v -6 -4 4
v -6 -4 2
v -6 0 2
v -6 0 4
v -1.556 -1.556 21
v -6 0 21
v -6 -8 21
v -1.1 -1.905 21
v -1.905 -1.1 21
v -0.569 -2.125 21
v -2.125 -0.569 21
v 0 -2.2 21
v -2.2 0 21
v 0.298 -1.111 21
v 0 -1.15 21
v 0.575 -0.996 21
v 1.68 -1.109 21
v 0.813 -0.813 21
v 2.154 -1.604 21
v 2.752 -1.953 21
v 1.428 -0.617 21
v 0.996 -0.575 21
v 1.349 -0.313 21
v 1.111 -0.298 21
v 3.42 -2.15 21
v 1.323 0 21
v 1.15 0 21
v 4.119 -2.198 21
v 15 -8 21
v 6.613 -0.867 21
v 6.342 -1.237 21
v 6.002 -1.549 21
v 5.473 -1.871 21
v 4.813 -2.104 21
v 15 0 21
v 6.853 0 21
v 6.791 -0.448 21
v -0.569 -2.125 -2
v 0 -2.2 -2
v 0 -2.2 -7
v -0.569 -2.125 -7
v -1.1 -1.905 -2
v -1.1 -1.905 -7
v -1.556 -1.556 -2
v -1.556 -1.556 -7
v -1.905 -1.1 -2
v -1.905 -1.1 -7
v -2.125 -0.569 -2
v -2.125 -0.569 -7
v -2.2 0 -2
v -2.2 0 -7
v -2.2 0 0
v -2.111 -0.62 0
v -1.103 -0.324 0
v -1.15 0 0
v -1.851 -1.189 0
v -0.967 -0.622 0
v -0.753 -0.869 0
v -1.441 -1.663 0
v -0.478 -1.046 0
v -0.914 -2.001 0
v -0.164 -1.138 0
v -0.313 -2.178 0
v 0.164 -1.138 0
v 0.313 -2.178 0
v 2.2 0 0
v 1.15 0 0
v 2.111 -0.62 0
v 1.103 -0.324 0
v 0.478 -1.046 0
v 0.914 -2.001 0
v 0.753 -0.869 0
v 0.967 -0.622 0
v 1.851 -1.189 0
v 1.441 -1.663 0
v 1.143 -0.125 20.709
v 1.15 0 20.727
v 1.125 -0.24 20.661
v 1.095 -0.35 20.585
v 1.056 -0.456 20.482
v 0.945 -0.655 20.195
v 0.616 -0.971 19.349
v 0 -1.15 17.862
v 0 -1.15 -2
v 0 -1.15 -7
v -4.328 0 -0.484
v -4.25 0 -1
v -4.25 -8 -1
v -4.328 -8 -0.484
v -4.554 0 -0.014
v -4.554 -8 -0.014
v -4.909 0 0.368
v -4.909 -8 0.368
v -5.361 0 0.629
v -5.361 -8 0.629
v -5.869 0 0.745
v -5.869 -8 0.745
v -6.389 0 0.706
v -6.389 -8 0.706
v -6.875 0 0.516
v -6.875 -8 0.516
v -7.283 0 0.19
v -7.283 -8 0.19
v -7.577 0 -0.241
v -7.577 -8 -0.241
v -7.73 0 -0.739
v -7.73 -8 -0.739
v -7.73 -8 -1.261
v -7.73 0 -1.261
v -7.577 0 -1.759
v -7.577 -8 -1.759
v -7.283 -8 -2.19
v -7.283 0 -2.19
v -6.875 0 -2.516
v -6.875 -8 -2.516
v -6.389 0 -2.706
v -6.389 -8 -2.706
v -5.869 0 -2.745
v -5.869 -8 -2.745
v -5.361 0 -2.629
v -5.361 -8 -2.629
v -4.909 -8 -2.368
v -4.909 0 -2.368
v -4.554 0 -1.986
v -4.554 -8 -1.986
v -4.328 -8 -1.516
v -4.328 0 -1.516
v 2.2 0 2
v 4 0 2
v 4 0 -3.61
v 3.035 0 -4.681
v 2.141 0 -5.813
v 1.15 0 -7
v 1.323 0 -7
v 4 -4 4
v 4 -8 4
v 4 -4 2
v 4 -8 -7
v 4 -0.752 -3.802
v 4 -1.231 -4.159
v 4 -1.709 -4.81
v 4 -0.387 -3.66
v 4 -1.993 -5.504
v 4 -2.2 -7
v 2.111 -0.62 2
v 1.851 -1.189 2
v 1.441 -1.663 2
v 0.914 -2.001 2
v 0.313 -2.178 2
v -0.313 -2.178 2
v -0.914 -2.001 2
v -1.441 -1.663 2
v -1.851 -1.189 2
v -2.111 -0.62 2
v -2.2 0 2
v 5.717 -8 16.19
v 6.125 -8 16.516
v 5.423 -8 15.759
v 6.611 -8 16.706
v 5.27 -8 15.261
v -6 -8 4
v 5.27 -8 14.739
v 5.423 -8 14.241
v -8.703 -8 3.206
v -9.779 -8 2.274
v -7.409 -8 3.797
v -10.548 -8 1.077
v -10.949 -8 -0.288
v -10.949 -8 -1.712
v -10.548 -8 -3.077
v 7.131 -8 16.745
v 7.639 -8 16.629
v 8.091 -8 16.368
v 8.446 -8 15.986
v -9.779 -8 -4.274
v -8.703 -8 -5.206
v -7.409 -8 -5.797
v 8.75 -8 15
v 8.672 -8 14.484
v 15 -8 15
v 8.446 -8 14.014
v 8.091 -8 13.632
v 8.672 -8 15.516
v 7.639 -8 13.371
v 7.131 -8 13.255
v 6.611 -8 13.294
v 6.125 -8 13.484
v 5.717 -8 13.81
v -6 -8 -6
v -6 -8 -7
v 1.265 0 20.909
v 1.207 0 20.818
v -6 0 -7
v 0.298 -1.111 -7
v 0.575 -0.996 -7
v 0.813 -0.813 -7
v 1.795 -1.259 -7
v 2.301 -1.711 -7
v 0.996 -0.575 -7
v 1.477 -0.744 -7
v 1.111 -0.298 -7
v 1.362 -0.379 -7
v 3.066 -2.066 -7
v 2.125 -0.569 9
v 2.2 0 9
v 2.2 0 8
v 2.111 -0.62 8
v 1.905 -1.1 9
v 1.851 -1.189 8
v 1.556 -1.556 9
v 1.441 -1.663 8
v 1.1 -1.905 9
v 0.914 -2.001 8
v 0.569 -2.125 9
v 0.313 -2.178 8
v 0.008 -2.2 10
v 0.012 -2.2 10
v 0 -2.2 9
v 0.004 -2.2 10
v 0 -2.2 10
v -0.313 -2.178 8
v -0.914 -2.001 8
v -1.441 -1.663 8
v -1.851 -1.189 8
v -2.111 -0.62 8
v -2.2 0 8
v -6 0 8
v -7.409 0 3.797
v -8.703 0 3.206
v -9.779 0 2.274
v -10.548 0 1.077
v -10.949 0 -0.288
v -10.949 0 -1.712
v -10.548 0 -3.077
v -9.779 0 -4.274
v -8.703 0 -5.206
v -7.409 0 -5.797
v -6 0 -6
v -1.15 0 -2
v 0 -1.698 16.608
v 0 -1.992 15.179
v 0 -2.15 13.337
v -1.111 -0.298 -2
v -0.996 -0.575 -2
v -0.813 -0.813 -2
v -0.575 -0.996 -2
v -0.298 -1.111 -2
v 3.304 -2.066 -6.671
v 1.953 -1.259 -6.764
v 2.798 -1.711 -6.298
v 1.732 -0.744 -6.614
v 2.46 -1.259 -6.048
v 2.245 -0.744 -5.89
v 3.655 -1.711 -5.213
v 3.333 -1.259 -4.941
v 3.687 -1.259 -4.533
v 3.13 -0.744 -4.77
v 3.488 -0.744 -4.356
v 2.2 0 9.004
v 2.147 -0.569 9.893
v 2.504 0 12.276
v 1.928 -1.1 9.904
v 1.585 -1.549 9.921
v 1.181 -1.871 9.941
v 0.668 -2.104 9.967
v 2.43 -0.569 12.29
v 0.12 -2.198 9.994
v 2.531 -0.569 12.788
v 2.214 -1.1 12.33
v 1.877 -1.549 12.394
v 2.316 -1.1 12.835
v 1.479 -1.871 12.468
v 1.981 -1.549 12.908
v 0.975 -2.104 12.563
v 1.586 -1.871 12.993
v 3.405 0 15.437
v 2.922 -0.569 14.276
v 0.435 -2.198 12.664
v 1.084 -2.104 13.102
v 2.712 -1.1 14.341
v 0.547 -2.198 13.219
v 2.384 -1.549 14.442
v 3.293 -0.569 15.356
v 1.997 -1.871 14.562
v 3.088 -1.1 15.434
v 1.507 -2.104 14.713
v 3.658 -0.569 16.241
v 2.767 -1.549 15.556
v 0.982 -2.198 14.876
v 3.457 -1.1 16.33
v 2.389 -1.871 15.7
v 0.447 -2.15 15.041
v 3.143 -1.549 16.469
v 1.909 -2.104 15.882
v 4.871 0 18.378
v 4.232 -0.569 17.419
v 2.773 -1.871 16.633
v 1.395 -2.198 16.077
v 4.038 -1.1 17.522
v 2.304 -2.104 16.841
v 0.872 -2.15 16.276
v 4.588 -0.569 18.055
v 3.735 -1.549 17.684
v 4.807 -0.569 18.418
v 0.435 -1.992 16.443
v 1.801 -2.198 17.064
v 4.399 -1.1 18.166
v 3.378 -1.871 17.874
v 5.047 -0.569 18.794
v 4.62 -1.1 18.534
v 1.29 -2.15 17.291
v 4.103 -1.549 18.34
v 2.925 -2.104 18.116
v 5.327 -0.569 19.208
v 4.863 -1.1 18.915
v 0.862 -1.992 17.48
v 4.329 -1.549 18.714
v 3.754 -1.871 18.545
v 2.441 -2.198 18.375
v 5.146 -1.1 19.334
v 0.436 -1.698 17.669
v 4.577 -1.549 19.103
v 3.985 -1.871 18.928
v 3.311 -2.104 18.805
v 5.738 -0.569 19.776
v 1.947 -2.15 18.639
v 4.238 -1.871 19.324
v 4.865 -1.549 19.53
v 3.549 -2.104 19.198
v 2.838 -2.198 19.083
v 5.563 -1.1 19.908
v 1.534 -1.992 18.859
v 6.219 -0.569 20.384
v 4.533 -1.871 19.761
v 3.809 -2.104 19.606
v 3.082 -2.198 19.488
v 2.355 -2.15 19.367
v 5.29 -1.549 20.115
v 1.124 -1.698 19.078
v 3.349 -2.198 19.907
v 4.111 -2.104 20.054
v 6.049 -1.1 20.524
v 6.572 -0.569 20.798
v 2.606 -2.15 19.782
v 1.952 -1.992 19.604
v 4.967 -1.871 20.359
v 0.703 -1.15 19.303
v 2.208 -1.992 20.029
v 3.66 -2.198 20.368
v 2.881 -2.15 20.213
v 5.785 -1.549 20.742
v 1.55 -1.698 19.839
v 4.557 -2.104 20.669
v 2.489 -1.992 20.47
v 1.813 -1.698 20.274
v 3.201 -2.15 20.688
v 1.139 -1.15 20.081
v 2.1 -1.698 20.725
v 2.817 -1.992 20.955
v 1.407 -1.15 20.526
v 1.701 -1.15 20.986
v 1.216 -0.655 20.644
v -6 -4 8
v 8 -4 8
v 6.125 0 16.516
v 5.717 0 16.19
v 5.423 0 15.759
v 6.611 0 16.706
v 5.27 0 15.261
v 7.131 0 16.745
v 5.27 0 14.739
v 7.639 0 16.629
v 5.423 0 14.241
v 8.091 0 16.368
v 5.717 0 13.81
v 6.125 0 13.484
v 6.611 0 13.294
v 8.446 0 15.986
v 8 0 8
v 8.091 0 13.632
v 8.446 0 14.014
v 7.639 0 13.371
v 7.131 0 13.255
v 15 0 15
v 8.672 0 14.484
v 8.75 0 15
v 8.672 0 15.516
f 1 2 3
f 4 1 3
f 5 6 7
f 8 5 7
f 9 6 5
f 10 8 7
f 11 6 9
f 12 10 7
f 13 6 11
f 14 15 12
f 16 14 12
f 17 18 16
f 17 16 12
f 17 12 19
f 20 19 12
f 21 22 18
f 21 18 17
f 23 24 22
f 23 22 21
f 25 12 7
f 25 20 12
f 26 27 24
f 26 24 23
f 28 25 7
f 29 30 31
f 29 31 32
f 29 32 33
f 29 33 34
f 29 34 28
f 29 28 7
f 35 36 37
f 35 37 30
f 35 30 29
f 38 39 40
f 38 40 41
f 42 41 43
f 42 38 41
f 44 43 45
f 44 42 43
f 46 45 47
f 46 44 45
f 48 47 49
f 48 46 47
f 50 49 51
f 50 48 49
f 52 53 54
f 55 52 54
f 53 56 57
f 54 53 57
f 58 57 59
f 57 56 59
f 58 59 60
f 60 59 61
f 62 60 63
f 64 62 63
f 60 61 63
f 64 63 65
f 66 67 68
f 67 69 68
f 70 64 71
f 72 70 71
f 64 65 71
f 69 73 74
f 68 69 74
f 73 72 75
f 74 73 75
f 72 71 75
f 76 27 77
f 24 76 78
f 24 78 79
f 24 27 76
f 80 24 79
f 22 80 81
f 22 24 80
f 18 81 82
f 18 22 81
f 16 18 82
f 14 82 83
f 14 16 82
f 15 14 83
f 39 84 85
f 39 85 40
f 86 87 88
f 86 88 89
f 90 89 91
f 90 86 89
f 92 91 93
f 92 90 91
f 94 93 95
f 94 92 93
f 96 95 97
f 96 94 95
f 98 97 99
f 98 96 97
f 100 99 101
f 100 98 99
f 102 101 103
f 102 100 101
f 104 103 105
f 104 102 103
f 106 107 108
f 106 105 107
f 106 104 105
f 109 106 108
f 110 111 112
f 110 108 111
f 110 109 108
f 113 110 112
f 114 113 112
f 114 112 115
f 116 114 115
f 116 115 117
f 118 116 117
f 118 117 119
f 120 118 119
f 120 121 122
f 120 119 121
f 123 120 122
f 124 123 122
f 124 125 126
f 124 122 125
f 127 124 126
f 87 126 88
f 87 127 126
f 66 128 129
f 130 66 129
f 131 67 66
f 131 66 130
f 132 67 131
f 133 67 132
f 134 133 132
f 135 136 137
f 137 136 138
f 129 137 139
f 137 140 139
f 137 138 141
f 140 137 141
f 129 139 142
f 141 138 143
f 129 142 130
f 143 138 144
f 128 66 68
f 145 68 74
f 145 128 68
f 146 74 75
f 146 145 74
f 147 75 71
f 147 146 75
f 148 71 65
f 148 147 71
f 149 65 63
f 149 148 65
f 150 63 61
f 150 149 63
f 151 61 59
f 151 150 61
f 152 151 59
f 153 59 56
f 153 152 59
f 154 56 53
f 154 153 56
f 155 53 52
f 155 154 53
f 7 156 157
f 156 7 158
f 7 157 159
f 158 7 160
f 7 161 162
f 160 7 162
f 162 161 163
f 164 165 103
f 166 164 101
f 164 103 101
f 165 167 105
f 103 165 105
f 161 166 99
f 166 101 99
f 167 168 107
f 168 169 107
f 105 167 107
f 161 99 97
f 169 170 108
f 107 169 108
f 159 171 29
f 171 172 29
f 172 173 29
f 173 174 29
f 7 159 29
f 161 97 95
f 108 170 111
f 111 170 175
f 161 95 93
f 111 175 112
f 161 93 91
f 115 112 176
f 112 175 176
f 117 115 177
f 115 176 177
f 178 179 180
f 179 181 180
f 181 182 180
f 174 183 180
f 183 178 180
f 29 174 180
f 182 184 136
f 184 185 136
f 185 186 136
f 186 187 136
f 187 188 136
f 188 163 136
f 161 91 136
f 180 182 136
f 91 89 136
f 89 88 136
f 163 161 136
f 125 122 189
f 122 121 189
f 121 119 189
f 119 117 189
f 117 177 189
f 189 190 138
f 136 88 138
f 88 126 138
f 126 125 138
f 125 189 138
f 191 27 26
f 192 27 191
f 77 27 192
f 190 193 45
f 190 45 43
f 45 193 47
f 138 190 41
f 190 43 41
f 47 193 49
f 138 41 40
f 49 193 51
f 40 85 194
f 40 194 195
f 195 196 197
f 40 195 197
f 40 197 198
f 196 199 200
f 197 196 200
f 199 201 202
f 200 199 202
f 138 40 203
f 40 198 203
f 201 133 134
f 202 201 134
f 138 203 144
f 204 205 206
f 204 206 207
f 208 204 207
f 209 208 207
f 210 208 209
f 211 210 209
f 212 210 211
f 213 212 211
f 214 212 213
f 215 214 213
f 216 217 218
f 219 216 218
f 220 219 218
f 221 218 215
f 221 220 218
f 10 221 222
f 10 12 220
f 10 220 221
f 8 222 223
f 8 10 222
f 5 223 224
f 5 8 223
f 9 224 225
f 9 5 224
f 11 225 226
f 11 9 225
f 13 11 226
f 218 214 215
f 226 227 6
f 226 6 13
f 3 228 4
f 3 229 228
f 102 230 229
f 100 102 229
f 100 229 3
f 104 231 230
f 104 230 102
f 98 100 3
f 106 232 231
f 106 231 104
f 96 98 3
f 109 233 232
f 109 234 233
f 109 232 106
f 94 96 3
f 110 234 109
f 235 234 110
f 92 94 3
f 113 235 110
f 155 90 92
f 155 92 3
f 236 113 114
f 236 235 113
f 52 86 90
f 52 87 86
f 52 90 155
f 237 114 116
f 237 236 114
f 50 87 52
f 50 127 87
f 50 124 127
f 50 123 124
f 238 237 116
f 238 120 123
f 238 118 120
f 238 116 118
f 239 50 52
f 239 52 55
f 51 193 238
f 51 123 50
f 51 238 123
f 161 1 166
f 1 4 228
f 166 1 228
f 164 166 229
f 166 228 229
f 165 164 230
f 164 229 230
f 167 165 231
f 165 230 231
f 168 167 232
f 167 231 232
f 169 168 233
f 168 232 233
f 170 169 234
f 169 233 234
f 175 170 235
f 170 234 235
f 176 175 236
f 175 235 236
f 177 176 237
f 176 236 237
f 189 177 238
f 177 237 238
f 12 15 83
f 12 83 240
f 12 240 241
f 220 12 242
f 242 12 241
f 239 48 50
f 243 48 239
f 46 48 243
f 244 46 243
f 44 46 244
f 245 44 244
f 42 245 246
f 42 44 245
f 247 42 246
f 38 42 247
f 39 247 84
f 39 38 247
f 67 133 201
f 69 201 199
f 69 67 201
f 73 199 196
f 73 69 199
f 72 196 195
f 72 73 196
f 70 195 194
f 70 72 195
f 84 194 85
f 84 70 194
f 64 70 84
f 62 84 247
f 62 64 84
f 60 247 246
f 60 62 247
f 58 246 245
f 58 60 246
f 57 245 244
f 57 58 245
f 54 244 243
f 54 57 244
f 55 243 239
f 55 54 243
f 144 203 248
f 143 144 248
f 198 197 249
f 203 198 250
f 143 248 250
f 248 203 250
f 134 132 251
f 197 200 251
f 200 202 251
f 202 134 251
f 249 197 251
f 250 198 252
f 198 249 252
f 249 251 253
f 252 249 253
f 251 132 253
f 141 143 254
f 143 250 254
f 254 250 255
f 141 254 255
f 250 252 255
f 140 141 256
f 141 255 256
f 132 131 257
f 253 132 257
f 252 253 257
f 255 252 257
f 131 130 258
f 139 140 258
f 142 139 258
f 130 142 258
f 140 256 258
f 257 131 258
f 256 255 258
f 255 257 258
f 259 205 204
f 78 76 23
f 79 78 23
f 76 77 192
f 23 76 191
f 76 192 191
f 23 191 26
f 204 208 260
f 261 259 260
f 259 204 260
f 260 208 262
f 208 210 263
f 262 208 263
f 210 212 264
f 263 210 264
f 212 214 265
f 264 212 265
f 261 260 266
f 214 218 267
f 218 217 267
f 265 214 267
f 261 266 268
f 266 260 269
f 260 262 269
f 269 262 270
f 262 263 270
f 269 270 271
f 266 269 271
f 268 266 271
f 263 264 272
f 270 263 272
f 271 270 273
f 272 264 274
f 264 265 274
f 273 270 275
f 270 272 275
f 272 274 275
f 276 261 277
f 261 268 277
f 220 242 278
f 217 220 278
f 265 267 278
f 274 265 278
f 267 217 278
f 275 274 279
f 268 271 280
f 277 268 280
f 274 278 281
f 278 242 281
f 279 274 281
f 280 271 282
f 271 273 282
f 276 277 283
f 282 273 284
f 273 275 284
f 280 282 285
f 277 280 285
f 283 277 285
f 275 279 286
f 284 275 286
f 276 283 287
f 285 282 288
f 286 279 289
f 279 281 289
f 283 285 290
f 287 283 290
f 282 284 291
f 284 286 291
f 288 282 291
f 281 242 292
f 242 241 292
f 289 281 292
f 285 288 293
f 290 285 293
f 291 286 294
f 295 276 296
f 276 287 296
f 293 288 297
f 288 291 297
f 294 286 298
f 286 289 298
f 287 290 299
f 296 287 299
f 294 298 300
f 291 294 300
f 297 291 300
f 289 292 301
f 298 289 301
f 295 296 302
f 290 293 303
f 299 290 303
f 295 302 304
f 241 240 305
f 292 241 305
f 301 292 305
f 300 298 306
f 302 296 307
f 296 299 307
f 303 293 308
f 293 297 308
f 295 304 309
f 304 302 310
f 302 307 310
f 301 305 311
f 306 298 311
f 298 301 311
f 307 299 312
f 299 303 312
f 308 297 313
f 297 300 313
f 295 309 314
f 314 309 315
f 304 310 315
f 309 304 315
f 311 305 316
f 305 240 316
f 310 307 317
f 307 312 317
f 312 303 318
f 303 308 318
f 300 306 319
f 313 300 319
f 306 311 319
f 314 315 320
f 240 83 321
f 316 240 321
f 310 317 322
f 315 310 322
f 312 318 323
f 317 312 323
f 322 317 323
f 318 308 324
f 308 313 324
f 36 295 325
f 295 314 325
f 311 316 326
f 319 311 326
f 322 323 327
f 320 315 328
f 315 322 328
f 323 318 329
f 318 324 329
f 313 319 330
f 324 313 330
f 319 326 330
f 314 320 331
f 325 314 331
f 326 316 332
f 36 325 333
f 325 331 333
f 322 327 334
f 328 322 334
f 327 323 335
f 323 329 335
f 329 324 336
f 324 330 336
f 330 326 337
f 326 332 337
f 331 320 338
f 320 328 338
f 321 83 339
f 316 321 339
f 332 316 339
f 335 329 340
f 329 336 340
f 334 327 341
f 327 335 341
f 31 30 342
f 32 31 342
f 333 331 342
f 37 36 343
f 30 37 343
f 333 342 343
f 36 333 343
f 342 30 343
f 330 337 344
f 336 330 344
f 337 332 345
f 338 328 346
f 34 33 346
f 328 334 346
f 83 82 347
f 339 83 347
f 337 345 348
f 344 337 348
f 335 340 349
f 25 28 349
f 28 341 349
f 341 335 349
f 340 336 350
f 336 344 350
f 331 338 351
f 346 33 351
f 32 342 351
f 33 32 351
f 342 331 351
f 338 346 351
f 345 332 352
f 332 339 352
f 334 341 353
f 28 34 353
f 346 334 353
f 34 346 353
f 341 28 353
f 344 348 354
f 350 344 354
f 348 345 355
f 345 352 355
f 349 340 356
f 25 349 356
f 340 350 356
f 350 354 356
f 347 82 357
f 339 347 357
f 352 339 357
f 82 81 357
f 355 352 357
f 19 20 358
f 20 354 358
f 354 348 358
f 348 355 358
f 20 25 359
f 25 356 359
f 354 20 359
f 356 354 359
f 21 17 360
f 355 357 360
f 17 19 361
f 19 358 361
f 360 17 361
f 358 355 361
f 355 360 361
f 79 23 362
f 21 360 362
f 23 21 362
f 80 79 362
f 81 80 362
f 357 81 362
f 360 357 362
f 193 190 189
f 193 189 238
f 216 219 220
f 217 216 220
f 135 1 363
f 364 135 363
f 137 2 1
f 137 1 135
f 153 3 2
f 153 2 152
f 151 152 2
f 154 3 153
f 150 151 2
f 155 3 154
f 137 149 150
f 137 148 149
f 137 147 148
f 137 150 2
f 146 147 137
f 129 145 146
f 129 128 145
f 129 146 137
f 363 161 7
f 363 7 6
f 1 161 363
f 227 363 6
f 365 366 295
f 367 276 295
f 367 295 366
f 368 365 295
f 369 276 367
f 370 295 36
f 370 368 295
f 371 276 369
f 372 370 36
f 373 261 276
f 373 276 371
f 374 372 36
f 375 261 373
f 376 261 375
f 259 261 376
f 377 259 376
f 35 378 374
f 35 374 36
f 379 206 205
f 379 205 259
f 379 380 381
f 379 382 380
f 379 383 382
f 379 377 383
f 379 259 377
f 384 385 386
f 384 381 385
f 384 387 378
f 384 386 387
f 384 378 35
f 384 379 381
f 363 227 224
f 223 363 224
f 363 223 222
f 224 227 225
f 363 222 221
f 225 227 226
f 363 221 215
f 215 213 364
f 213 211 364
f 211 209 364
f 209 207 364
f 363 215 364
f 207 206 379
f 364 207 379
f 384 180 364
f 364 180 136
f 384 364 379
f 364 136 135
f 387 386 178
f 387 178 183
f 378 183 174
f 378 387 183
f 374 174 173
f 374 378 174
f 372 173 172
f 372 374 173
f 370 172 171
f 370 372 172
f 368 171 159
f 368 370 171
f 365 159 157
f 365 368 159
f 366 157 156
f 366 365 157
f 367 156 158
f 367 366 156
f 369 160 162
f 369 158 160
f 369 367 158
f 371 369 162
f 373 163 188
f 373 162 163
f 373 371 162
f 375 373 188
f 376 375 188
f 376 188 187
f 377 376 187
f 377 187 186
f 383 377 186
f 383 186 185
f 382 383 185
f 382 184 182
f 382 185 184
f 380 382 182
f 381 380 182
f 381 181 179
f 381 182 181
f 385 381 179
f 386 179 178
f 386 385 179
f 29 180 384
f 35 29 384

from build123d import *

# Parameters (mm, degrees)
BOX001027045134_W           = 10
BOX001027045134_H           = 10
BOX001027045134_DEPTH       = 32
CYLINDER192_R               = 2.2
CYLINDER192_DEPTH           = 17
CUT158_PLACEMENT_ANGLE      = 180
BOX001027045133_W           = 10
BOX001027045133_H           = 10
BOX001027045133_DEPTH       = 32
BOX001027045132_W           = 15
BOX001027045132_H           = 10
BOX001027045132_DEPTH       = 18
BOX001027045135_W           = 25
BOX001027045135_H           = 10
BOX001027045135_DEPTH       = 25
TORUS013_R                  = 2.2
TORUS013_ROLL_ANGLE         = 90
COMMON091_PITCH_ANGLE       = -45
COMMON090_PLACEMENT_ANGLE   = 180
CYLINDER191_R               = 2.2
CYLINDER191_DEPTH           = 9
CYLINDER193_R               = 2.2
CYLINDER193_DEPTH           = 9
CYLINDER190_R               = 1.15
CYLINDER190_DEPTH           = 32
CYLINDER171_R               = 1.75
CYLINDER171_DEPTH           = 30
CYLINDER171_ROLL_ANGLE      = 90
CYLINDER195_R               = 1.75
CYLINDER195_DEPTH           = 30
CYLINDER195_ROLL_ANGLE      = 90
BOX001027045140_W           = 26
BOX001027045140_H           = 21
BOX001027045140_DEPTH       = 6
CYLINDER189_R               = 5
CYLINDER189_DEPTH           = 8
CYLINDER189_ROLL_ANGLE      = 90
BOX001027045139_W           = 21
BOX001027045139_H           = 10
BOX001027045139_DEPTH       = 28
BOX001027045139_PITCH_ANGLE = 45
BOX001027045138_W           = 21
BOX001027045138_H           = 10
BOX001027045138_DEPTH       = 28
BOX001027045137_W           = 21
BOX001027045137_H           = 8
BOX001027045137_DEPTH       = 28


with BuildPart() as cube187:
    # Box001027045134 → Box001027045134 (new body)
    with BuildSketch(Plane(origin=(0, -5, -22), x_dir=(1, 0, 0), z_dir=(0, 0, 1))):
        with Locations((5, 5)):
            Rectangle(BOX001027045134_W, BOX001027045134_H)
    extrude(amount=BOX001027045134_DEPTH)


with BuildPart() as cut158:
    # Cylinder192 → Cylinder192 (new body)
    with BuildSketch(Plane.XY.offset(-15)):
        Circle(CYLINDER192_R)
    extrude(amount=CYLINDER192_DEPTH)

    # Cut158: cut Cube187
    add(cube187.part, mode=Mode.SUBTRACT)


with BuildPart() as cut158_1:
    # Cut158 placement: moved
    add(cut158.part.moved(Location((0, 0, 6))).rotate(Axis((0, 0, 6), (1, 0, 0)), CUT158_PLACEMENT_ANGLE))


with BuildPart() as cube186:
    # Box001027045133 → Box001027045133 (new body)
    with BuildSketch(Plane(origin=(0, -5, -22), x_dir=(1, 0, 0), z_dir=(0, 0, 1))):
        with Locations((5, 5)):
            Rectangle(BOX001027045133_W, BOX001027045133_H)
    extrude(amount=BOX001027045133_DEPTH)


with BuildPart() as cube185:
    # Box001027045132 → Box001027045132 (new body)
    with BuildSketch(Plane(origin=(-5, -5, -18), x_dir=(1, 0, 0), z_dir=(0, 0, 1))):
        with Locations((7.5, 5)):
            Rectangle(BOX001027045132_W, BOX001027045132_H)
    extrude(amount=BOX001027045132_DEPTH)


with BuildPart() as cube188:
    # Box001027045135 → Box001027045135 (new body)
    with BuildSketch(Plane(origin=(-3, -5, -1), x_dir=(1, 0, 0), z_dir=(0, 0, 1))):
        with Locations((12.5, 5)):
            Rectangle(BOX001027045135_W, BOX001027045135_H)
    extrude(amount=BOX001027045135_DEPTH)


with BuildPart() as common090:
    # Torus013 → Torus013 (revolve)
    with BuildSketch(Plane.XZ):
        with Locations((20, 0)):
            Circle(TORUS013_R)
    revolve(axis=Axis((0, 0, 0), (0, 0, 1)))


with BuildPart() as common090_1:
    # Torus013 roll: moved
    add(common090.part.rotate(Axis((0, 0, 0), (1, 0, 0)), TORUS013_ROLL_ANGLE))


with BuildPart() as common090_2:
    # Torus013 placement: moved
    add(common090_1.part.moved(Location((20, 0, 0))))

    # Common091: intersect Cube188
    add(cube188.part, mode=Mode.INTERSECT)


with BuildPart() as common090_3:
    # Common091 pitch: moved
    add(common090_2.part.rotate(Axis((0, 0, 0), (0, 1, 0)), COMMON091_PITCH_ANGLE))


with BuildPart() as common090_4:
    # Common091 placement: moved
    add(common090_3.part.moved(Location((5.857864, 0, -14.142136))))

    # Common089: intersect Cube185
    add(cube185.part, mode=Mode.INTERSECT)

    # Common090: intersect Cube186
    add(cube186.part, mode=Mode.INTERSECT)


with BuildPart() as common090_5:
    # Common090 placement: moved
    add(common090_4.part.moved(Location((0, 0, 4))).rotate(Axis((0, 0, 4), (1, 0, 0)), COMMON090_PLACEMENT_ANGLE))


with BuildPart() as cylinder238:
    # Cylinder191 → Cylinder191 (new body)
    with BuildSketch(Plane(origin=(0, 0, 4), x_dir=(1, 0, 0), z_dir=(0, 0, -1))):
        Circle(CYLINDER191_R)
    extrude(amount=CYLINDER191_DEPTH)


with BuildPart() as cylinder240:
    # Cylinder193 → Cylinder193 (new body)
    with BuildSketch(Plane(origin=(0, 0, 33), x_dir=(1, 0, 0), z_dir=(0, 0, -1))):
        Circle(CYLINDER193_R)
    extrude(amount=CYLINDER193_DEPTH)


with BuildPart() as cylinder237:
    # Cylinder190 → Cylinder190 (new body)
    with BuildSketch(Plane(origin=(0, 0, 30), x_dir=(1, 0, 0), z_dir=(0, 0, -1))):
        Circle(CYLINDER190_R)
    extrude(amount=CYLINDER190_DEPTH)


with BuildPart() as filament_path002:
    # Fusion112095 base: copy of Cylinder237
    add(cylinder237.part)

    # Fusion112095: union Cut158, Common090, Cylinder238, Cylinder240
    add(cut158_1.part)
    add(common090_5.part)
    add(cylinder238.part)
    add(cylinder240.part)


with BuildPart() as filament_path002_1:
    # Fusion112095 placement: moved
    add(filament_path002.part.moved(Location((0, 0, 5))))


with BuildPart() as top_path:
    # Fusion112086 base: copy of Cylinder237
    add(cylinder237.part)

    # Fusion112086: union Cut158, Common090, Cylinder238, Cylinder240
    add(cut158_1.part)
    add(common090_5.part)
    add(cylinder238.part)
    add(cylinder240.part)


with BuildPart() as top_path_1:
    # Fusion112086 placement: moved
    add(top_path.part.moved(Location((0, 0, -23))))

    # Fusion112096: union filament-path002
    add(filament_path002_1.part)


with BuildPart() as m3_clear:
    # Cylinder171 → Cylinder171 (new body)
    with BuildSketch(Plane.XY):
        Circle(CYLINDER171_R)
    extrude(amount=CYLINDER171_DEPTH)


with BuildPart() as m3_clear_1:
    # Cylinder171 roll: moved
    add(m3_clear.part.rotate(Axis((0, 0, 0), (1, 0, 0)), CYLINDER171_ROLL_ANGLE))


with BuildPart() as m3_clear_2:
    # Cylinder171 placement: moved
    add(m3_clear_1.part.moved(Location((7, 13, 15))))


with BuildPart() as top_m3_clear:
    # Cylinder195 → Cylinder195 (new body)
    with BuildSketch(Plane.XY):
        Circle(CYLINDER195_R)
    extrude(amount=CYLINDER195_DEPTH)


with BuildPart() as top_m3_clear_1:
    # Cylinder195 roll: moved
    add(top_m3_clear.part.rotate(Axis((0, 0, 0), (1, 0, 0)), CYLINDER195_ROLL_ANGLE))


with BuildPart() as top_m3_clear_2:
    # Cylinder195 placement: moved
    add(top_m3_clear_1.part.moved(Location((-6, 13, -1))))

    # Fusion112093: union M3-clear
    add(m3_clear_2.part)


with BuildPart() as cube193:
    # Box001027045140 → Box001027045140 (new body)
    with BuildSketch(Plane(origin=(-6, -4, 2), x_dir=(1, 0, 0), z_dir=(0, 0, 1))):
        with Locations((13, 10.5)):
            Rectangle(BOX001027045140_W, BOX001027045140_H)
    extrude(amount=BOX001027045140_DEPTH)


with BuildPart() as screw_bump_top:
    # Cylinder189 → Cylinder189 (new body)
    with BuildSketch(Plane.XY):
        Circle(CYLINDER189_R)
    extrude(amount=CYLINDER189_DEPTH)


with BuildPart() as screw_bump_top_1:
    # Cylinder189 roll: moved
    add(screw_bump_top.part.rotate(Axis((0, 0, 0), (1, 0, 0)), CYLINDER189_ROLL_ANGLE))


with BuildPart() as screw_bump_top_2:
    # Cylinder189 placement: moved
    add(screw_bump_top_1.part.moved(Location((-6, 0, -1))))


with BuildPart() as cube192:
    # Box001027045139 → Box001027045139 (new body)
    with BuildSketch(Plane.XY):
        with Locations((10.5, 5)):
            Rectangle(BOX001027045139_W, BOX001027045139_H)
    extrude(amount=BOX001027045139_DEPTH)


with BuildPart() as cube192_1:
    # Box001027045139 pitch: moved
    add(cube192.part.rotate(Axis((0, 0, 0), (0, 1, 0)), BOX001027045139_PITCH_ANGLE))


with BuildPart() as cube192_2:
    # Box001027045139 placement: moved
    add(cube192_1.part.moved(Location((-6, -9, 21))))


with BuildPart() as fusion112087:
    # Box001027045138 → Box001027045138 (new body)
    with BuildSketch(Plane(origin=(-6, -9, -7), x_dir=(1, 0, 0), z_dir=(0, 0, 1))):
        with Locations((10.5, 5)):
            Rectangle(BOX001027045138_W, BOX001027045138_H)
    extrude(amount=BOX001027045138_DEPTH)

    # Fusion112087: union Cube192
    add(cube192_2.part)


with BuildPart() as fusion112087_1:
    # Fusion112087 placement: moved
    add(fusion112087.part.moved(Location((10, 0, -17))))


with BuildPart() as top:
    # Box001027045137 → Box001027045137 (new body)
    with BuildSketch(Plane(origin=(-6, -8, -7), x_dir=(1, 0, 0), z_dir=(0, 0, 1))):
        with Locations((10.5, 4)):
            Rectangle(BOX001027045137_W, BOX001027045137_H)
    extrude(amount=BOX001027045137_DEPTH)

    # Cut160: cut Fusion112087
    add(fusion112087_1.part, mode=Mode.SUBTRACT)

    # Fusion112088: union screw-bump-top
    add(screw_bump_top_2.part)

    # Cut161: cut Cube193
    add(cube193.part, mode=Mode.SUBTRACT)

    # Cut167: cut top-m3-clear
    add(top_m3_clear_2.part, mode=Mode.SUBTRACT)

    # Cut170: cut top-path
    add(top_path_1.part, mode=Mode.SUBTRACT)


solid = top.part
